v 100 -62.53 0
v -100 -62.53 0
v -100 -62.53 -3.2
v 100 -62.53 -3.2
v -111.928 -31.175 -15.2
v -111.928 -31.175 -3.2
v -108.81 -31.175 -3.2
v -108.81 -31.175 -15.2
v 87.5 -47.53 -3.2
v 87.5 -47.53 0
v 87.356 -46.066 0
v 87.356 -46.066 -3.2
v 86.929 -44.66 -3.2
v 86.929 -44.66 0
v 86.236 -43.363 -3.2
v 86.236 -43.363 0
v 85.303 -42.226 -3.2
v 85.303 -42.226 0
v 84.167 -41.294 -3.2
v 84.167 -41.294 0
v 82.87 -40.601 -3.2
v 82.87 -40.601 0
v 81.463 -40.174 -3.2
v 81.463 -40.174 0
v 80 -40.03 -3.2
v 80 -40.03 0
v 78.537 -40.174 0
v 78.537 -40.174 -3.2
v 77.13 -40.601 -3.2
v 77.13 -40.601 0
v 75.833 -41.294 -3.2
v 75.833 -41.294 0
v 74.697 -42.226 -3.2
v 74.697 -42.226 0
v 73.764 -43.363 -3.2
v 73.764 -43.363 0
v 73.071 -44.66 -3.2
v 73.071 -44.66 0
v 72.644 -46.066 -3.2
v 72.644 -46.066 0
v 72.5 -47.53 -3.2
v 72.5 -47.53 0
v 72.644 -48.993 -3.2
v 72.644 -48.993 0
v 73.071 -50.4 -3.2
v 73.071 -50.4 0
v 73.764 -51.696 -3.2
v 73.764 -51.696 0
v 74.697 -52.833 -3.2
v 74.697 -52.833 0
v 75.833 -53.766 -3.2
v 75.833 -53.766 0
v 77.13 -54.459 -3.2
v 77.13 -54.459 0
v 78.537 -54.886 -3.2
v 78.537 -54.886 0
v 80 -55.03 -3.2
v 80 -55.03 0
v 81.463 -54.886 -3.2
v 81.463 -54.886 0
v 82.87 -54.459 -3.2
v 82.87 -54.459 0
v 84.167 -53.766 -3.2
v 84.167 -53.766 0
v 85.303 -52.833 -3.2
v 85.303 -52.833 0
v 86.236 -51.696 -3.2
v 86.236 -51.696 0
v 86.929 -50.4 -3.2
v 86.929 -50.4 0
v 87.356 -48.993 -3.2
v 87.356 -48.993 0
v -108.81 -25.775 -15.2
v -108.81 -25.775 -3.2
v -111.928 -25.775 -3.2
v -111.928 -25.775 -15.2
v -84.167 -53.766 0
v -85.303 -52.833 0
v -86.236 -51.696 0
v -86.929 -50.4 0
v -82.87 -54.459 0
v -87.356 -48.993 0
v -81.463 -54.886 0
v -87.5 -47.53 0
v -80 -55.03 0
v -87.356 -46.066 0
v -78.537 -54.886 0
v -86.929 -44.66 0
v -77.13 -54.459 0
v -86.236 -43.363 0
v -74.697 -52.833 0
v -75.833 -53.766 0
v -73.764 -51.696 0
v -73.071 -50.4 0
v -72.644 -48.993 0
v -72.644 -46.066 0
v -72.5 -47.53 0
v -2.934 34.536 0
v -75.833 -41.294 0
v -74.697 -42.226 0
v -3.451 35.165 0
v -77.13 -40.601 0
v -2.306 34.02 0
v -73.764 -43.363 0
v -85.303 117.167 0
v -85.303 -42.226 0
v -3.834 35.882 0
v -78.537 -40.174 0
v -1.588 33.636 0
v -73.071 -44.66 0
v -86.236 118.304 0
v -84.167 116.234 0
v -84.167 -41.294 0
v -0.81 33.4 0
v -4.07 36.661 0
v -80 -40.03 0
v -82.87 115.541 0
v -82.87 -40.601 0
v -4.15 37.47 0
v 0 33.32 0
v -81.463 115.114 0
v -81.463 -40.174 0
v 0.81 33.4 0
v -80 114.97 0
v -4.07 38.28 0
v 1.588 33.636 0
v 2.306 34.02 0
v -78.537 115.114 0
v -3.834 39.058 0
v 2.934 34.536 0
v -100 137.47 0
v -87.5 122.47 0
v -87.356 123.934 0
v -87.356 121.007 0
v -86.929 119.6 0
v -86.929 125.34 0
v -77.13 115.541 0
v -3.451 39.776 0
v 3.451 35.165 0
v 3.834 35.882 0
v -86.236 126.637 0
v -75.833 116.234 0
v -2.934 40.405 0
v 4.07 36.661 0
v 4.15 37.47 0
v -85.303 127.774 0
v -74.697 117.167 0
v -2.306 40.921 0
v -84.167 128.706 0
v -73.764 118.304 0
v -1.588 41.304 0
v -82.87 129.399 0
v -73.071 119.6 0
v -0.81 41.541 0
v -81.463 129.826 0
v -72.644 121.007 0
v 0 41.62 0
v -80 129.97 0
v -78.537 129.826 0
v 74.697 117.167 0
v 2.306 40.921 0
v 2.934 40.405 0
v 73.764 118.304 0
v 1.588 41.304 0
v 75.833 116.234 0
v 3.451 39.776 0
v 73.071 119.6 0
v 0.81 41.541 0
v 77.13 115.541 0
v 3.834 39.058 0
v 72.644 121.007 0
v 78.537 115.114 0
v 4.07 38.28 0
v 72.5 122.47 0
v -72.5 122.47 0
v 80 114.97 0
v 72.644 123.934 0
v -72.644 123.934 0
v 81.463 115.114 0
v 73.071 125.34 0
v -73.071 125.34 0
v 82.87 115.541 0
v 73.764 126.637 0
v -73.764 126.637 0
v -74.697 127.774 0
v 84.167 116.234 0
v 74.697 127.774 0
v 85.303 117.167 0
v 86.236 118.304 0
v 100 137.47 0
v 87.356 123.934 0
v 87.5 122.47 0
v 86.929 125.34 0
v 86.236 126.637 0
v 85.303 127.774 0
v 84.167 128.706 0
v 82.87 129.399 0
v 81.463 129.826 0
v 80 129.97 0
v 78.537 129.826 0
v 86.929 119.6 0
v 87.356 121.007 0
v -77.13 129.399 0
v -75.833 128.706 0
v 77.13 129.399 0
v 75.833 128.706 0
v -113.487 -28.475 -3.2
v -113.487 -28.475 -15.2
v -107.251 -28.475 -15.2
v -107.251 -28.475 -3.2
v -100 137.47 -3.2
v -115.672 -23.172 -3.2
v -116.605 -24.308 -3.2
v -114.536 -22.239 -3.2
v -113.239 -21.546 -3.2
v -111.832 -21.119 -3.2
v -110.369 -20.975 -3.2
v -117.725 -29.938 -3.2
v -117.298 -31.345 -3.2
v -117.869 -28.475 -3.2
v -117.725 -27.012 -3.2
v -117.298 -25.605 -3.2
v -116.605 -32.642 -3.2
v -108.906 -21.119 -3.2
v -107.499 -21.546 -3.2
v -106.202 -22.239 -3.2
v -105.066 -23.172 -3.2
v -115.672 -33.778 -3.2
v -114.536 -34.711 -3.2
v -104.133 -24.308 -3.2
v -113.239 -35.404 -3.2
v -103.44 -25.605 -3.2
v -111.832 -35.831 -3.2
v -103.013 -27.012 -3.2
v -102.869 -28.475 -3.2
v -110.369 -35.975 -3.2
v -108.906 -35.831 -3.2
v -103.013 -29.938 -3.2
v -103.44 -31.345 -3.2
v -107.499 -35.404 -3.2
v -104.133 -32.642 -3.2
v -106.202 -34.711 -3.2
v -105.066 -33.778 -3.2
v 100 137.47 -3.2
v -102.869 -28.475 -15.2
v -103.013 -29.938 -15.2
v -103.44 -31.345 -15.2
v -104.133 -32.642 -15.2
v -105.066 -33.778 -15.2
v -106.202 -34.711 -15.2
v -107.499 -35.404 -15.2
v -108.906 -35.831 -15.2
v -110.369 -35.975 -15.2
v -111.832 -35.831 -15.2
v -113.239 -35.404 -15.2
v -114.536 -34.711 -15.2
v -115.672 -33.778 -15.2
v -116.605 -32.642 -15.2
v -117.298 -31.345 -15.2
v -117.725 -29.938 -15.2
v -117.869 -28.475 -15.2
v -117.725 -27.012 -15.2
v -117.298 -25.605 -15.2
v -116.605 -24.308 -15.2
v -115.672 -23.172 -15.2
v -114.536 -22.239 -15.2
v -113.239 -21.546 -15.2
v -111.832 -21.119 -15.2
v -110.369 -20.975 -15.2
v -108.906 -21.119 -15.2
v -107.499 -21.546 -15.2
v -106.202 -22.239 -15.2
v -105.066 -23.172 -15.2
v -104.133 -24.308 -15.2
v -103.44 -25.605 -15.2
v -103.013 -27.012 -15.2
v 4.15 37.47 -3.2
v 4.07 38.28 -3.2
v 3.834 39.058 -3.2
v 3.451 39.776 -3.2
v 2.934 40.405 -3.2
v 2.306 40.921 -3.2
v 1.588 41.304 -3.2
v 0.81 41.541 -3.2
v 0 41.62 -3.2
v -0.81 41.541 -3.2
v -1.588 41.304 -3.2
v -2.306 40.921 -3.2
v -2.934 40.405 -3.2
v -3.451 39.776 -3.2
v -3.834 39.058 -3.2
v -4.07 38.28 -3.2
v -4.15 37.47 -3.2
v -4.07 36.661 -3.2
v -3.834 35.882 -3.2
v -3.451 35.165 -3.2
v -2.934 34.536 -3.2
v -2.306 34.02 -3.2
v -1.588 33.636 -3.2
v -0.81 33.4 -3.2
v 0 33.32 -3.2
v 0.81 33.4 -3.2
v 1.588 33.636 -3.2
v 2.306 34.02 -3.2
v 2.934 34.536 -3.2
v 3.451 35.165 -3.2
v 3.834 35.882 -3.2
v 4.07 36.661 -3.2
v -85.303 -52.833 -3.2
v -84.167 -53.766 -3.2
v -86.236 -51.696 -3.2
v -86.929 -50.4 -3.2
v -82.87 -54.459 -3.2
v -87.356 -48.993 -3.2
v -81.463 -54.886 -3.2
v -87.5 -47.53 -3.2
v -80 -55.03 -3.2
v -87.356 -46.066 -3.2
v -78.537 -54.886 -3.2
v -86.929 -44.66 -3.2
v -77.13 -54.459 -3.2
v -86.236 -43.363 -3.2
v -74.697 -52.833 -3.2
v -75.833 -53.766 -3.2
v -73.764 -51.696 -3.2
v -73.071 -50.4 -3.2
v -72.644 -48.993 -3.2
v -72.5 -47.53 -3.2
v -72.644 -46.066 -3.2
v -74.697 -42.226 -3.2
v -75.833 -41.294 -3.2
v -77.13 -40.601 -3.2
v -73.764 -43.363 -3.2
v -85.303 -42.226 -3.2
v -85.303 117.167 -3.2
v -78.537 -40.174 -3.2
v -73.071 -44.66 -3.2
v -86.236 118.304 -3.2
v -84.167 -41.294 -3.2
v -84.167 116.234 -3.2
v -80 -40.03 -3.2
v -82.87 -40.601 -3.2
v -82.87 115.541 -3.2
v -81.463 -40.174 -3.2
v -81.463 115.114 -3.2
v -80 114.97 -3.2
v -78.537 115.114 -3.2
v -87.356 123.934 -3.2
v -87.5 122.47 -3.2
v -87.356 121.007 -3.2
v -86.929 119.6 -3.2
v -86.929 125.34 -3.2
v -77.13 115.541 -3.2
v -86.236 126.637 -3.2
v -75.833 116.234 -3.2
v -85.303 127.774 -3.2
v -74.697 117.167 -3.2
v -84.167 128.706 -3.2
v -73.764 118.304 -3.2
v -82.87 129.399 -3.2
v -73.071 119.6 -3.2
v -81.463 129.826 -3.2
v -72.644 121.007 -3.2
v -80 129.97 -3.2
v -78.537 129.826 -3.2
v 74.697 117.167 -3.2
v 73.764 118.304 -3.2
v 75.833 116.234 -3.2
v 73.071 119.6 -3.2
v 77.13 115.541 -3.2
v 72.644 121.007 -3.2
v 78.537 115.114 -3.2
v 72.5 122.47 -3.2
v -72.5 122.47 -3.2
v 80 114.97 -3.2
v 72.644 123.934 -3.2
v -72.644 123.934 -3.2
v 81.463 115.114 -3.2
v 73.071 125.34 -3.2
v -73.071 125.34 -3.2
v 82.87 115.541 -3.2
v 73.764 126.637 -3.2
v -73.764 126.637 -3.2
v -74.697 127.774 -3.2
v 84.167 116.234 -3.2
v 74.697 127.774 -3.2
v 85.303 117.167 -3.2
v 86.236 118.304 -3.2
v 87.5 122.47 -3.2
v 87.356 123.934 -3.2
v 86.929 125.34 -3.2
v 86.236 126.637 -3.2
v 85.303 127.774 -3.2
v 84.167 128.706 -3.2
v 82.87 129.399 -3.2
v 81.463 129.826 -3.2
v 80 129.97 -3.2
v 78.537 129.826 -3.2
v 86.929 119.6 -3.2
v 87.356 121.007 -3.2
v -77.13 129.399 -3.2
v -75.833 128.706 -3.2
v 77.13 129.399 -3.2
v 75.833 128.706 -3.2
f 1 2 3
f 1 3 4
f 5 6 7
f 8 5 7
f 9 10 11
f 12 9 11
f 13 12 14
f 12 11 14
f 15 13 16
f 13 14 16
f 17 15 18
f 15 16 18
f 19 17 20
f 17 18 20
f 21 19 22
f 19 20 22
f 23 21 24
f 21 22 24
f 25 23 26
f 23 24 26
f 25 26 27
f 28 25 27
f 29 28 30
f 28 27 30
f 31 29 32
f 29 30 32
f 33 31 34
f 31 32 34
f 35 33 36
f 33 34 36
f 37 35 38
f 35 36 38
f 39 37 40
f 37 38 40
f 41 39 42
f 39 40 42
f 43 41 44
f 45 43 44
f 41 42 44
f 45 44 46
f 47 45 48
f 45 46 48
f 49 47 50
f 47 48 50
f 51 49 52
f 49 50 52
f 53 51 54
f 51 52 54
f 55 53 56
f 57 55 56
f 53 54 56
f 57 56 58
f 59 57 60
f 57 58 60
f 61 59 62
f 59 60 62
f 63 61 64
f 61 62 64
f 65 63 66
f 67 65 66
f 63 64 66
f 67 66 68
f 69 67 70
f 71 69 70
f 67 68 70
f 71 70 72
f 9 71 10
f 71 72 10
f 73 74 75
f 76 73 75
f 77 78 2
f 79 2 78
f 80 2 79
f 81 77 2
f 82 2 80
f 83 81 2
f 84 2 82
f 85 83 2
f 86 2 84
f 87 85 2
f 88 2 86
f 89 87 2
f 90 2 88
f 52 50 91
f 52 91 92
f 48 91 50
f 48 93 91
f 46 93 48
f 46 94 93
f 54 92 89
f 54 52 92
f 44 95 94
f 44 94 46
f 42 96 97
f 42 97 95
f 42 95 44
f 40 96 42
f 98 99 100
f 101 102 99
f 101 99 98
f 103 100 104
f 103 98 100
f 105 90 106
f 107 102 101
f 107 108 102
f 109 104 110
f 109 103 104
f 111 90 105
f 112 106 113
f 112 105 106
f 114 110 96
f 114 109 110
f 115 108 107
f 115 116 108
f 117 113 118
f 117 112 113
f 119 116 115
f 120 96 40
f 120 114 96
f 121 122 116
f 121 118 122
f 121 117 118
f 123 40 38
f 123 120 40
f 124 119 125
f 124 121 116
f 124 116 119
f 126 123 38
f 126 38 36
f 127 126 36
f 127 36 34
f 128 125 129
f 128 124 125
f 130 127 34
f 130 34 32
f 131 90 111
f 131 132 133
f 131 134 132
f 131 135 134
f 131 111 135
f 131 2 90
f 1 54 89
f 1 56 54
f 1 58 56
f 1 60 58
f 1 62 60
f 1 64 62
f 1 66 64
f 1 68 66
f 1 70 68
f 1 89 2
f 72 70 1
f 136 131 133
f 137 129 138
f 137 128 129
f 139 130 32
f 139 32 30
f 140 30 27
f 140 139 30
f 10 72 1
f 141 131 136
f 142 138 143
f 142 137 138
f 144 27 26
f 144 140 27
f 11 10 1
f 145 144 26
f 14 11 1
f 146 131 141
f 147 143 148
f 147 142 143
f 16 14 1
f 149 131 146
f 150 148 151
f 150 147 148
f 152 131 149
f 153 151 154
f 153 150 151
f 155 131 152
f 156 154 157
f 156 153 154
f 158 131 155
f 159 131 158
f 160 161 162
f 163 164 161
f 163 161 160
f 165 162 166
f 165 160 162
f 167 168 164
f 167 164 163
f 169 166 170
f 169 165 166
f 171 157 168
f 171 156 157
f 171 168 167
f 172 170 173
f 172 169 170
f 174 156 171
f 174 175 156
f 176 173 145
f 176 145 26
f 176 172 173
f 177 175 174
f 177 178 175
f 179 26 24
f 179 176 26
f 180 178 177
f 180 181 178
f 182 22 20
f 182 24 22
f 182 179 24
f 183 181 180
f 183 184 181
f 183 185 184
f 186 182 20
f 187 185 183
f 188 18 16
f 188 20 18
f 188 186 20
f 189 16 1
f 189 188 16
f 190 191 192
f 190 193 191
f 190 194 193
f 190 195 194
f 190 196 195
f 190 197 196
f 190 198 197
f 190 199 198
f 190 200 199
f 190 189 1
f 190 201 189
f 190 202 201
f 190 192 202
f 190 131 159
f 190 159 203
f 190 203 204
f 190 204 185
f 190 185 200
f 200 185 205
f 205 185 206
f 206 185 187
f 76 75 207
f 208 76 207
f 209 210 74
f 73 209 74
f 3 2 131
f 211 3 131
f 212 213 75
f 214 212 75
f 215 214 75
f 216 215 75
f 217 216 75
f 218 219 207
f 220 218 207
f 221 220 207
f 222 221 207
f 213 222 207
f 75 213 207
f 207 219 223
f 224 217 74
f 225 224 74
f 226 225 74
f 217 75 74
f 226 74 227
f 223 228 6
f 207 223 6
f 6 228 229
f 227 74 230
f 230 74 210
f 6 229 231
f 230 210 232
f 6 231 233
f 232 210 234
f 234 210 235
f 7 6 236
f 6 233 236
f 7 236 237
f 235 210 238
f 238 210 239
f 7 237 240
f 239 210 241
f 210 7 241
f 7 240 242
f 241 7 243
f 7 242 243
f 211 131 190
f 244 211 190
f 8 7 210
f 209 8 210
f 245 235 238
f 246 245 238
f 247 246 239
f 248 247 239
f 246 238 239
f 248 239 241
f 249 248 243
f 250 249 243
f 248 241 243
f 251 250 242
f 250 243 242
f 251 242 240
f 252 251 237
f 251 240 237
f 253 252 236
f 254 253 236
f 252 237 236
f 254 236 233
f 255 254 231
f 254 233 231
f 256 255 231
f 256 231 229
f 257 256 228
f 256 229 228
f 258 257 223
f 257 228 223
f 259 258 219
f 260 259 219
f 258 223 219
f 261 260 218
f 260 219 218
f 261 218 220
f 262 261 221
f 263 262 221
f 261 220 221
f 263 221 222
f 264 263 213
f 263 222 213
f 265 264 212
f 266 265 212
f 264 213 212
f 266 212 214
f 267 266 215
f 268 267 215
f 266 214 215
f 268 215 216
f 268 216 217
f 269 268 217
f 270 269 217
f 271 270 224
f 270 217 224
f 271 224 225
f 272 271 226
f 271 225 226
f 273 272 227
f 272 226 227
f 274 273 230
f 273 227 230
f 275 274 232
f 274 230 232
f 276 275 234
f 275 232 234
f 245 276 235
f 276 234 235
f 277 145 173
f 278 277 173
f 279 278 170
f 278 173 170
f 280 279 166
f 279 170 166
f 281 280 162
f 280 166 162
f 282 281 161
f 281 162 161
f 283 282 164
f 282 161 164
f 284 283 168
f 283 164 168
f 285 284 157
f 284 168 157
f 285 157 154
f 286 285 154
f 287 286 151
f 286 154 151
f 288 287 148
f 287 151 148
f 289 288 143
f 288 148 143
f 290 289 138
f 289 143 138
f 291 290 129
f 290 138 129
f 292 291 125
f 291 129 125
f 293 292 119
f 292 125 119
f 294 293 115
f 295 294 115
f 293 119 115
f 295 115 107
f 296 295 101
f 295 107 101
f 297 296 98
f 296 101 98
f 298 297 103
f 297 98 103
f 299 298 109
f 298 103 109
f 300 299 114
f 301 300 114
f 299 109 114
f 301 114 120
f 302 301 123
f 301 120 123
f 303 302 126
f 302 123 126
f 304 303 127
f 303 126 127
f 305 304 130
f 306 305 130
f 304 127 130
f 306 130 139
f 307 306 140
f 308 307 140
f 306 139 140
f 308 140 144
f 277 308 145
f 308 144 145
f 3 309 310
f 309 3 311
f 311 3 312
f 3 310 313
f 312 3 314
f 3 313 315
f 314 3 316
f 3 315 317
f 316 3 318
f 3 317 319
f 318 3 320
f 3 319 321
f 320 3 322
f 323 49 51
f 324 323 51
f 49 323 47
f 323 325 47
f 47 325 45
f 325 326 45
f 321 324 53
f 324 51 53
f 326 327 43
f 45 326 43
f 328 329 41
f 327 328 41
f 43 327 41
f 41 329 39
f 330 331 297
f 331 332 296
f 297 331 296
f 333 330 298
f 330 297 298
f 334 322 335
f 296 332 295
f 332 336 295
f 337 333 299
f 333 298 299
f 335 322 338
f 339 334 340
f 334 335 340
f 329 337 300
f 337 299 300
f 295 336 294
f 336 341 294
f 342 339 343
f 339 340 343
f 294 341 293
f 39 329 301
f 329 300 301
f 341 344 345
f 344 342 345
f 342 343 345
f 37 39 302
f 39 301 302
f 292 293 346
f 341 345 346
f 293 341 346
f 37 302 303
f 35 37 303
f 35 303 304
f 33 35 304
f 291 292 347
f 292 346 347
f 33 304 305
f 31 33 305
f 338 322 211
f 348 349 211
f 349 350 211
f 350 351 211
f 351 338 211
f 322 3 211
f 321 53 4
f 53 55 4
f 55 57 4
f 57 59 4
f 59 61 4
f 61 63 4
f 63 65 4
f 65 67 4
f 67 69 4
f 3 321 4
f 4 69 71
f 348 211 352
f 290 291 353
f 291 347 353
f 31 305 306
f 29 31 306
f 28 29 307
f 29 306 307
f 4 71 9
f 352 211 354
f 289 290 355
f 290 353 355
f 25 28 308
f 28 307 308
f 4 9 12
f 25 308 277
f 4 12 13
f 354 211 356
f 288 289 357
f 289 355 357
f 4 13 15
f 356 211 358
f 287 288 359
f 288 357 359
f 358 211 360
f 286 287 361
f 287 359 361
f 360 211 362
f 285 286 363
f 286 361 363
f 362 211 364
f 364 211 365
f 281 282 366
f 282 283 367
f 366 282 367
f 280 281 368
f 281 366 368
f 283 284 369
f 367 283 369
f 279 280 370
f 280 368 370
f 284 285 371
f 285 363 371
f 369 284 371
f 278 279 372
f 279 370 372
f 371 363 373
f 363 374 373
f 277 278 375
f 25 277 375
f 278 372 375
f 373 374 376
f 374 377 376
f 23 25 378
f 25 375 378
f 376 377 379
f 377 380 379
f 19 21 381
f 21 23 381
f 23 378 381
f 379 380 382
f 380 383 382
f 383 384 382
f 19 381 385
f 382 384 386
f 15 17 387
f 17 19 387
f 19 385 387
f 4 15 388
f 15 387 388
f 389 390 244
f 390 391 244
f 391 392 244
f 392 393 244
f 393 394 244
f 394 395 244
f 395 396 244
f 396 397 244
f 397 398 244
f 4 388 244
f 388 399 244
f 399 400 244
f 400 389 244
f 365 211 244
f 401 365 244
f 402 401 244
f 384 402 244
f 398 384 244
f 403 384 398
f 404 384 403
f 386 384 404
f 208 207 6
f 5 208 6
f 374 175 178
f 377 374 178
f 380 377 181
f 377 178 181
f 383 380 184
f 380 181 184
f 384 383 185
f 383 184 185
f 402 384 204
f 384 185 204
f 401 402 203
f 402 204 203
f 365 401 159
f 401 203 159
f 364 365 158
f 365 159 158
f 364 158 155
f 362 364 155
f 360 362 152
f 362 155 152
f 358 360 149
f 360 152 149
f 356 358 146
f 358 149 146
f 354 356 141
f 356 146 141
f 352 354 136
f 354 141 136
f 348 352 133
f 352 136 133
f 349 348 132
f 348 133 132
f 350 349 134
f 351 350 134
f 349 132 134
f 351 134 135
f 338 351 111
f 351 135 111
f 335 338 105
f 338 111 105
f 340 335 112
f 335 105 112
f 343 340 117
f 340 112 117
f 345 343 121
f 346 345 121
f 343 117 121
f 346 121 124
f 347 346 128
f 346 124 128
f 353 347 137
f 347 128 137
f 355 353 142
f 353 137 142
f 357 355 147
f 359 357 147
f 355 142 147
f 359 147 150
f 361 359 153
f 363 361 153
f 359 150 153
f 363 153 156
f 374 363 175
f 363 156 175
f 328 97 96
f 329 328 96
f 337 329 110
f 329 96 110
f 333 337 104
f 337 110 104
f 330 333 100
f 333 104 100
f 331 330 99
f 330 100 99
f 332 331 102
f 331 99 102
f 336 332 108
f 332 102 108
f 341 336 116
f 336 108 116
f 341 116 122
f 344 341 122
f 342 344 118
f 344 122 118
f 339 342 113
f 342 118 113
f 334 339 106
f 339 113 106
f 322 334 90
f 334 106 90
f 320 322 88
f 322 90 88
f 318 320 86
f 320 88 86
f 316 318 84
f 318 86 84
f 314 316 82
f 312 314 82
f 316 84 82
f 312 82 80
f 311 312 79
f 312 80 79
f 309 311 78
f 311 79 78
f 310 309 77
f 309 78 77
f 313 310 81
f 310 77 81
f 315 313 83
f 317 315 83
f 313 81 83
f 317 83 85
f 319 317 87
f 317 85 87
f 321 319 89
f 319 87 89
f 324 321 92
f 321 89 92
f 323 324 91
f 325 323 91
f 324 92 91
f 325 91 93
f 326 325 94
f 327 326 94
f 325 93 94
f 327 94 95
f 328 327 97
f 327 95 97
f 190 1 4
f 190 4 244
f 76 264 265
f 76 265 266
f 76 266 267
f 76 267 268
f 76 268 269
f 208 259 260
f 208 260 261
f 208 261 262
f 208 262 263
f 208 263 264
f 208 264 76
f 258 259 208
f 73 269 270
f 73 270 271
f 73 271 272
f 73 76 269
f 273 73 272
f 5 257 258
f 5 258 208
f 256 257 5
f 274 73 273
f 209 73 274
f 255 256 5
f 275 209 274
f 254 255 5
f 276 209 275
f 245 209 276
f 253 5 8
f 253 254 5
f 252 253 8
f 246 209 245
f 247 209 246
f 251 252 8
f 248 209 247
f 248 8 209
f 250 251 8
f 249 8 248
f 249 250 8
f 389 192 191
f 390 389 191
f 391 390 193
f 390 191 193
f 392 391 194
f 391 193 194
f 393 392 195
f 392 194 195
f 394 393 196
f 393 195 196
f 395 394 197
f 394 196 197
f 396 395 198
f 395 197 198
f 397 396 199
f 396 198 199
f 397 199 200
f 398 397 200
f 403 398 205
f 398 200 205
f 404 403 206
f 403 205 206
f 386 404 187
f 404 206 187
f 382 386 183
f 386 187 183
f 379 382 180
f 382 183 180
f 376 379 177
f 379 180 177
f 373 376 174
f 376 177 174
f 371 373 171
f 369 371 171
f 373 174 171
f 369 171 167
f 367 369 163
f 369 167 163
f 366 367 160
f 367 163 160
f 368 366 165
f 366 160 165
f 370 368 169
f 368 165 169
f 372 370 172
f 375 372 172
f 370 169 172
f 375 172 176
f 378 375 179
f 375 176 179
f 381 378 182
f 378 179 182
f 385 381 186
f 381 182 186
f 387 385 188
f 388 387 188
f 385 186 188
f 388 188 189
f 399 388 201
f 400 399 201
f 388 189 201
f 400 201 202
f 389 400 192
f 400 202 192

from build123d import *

# Parameters (mm, degrees)
F0_W     = 200
F0_H     = 200
F0_R     = 7.5
F0_R_2   = 4.15
F1_DEPTH = 3.2
F2_R     = 7.5
F3_DEPTH = 12


with BuildPart() as f1:
    # F0 (on Top) → F1 (new body)
    with BuildSketch(Plane.XY):
        with Locations((0, 37.4703630805)):
            Rectangle(F0_W, F0_H)
        with Locations((-80, -47.5296369195)):
            Circle(F0_R, mode=Mode.SUBTRACT)
        with Locations((80, -47.5296369195)):
            Circle(F0_R, mode=Mode.SUBTRACT)
        with Locations((0, 37.4703630805)):
            Circle(F0_R_2, mode=Mode.SUBTRACT)
        with Locations((-80, 122.4703630805)):
            Circle(F0_R, mode=Mode.SUBTRACT)
        with Locations((80, 122.4703630805)):
            Circle(F0_R, mode=Mode.SUBTRACT)
    extrude(amount=-F1_DEPTH)


with BuildPart() as f3:
    # F2 (on face) → F3 (new body)
    with BuildSketch(Plane(origin=(0, 0, -3.2), x_dir=(1, 0, 0), z_dir=(0, 0, -1))):
        with Locations((-110.3689859124, 28.4748198305)):
            Circle(F2_R)
        Polygon((-113.4869859124, 28.4748198305), (-111.9279859124, 31.1750870395), (-108.8099859124, 31.1750870395), (-107.2509859124, 28.4748198305), (-108.8099859124, 25.7745526215), (-111.9279859124, 25.7745526215), align=None, mode=Mode.SUBTRACT)
    extrude(amount=F3_DEPTH)


solid = Compound([f1.part, f3.part])
